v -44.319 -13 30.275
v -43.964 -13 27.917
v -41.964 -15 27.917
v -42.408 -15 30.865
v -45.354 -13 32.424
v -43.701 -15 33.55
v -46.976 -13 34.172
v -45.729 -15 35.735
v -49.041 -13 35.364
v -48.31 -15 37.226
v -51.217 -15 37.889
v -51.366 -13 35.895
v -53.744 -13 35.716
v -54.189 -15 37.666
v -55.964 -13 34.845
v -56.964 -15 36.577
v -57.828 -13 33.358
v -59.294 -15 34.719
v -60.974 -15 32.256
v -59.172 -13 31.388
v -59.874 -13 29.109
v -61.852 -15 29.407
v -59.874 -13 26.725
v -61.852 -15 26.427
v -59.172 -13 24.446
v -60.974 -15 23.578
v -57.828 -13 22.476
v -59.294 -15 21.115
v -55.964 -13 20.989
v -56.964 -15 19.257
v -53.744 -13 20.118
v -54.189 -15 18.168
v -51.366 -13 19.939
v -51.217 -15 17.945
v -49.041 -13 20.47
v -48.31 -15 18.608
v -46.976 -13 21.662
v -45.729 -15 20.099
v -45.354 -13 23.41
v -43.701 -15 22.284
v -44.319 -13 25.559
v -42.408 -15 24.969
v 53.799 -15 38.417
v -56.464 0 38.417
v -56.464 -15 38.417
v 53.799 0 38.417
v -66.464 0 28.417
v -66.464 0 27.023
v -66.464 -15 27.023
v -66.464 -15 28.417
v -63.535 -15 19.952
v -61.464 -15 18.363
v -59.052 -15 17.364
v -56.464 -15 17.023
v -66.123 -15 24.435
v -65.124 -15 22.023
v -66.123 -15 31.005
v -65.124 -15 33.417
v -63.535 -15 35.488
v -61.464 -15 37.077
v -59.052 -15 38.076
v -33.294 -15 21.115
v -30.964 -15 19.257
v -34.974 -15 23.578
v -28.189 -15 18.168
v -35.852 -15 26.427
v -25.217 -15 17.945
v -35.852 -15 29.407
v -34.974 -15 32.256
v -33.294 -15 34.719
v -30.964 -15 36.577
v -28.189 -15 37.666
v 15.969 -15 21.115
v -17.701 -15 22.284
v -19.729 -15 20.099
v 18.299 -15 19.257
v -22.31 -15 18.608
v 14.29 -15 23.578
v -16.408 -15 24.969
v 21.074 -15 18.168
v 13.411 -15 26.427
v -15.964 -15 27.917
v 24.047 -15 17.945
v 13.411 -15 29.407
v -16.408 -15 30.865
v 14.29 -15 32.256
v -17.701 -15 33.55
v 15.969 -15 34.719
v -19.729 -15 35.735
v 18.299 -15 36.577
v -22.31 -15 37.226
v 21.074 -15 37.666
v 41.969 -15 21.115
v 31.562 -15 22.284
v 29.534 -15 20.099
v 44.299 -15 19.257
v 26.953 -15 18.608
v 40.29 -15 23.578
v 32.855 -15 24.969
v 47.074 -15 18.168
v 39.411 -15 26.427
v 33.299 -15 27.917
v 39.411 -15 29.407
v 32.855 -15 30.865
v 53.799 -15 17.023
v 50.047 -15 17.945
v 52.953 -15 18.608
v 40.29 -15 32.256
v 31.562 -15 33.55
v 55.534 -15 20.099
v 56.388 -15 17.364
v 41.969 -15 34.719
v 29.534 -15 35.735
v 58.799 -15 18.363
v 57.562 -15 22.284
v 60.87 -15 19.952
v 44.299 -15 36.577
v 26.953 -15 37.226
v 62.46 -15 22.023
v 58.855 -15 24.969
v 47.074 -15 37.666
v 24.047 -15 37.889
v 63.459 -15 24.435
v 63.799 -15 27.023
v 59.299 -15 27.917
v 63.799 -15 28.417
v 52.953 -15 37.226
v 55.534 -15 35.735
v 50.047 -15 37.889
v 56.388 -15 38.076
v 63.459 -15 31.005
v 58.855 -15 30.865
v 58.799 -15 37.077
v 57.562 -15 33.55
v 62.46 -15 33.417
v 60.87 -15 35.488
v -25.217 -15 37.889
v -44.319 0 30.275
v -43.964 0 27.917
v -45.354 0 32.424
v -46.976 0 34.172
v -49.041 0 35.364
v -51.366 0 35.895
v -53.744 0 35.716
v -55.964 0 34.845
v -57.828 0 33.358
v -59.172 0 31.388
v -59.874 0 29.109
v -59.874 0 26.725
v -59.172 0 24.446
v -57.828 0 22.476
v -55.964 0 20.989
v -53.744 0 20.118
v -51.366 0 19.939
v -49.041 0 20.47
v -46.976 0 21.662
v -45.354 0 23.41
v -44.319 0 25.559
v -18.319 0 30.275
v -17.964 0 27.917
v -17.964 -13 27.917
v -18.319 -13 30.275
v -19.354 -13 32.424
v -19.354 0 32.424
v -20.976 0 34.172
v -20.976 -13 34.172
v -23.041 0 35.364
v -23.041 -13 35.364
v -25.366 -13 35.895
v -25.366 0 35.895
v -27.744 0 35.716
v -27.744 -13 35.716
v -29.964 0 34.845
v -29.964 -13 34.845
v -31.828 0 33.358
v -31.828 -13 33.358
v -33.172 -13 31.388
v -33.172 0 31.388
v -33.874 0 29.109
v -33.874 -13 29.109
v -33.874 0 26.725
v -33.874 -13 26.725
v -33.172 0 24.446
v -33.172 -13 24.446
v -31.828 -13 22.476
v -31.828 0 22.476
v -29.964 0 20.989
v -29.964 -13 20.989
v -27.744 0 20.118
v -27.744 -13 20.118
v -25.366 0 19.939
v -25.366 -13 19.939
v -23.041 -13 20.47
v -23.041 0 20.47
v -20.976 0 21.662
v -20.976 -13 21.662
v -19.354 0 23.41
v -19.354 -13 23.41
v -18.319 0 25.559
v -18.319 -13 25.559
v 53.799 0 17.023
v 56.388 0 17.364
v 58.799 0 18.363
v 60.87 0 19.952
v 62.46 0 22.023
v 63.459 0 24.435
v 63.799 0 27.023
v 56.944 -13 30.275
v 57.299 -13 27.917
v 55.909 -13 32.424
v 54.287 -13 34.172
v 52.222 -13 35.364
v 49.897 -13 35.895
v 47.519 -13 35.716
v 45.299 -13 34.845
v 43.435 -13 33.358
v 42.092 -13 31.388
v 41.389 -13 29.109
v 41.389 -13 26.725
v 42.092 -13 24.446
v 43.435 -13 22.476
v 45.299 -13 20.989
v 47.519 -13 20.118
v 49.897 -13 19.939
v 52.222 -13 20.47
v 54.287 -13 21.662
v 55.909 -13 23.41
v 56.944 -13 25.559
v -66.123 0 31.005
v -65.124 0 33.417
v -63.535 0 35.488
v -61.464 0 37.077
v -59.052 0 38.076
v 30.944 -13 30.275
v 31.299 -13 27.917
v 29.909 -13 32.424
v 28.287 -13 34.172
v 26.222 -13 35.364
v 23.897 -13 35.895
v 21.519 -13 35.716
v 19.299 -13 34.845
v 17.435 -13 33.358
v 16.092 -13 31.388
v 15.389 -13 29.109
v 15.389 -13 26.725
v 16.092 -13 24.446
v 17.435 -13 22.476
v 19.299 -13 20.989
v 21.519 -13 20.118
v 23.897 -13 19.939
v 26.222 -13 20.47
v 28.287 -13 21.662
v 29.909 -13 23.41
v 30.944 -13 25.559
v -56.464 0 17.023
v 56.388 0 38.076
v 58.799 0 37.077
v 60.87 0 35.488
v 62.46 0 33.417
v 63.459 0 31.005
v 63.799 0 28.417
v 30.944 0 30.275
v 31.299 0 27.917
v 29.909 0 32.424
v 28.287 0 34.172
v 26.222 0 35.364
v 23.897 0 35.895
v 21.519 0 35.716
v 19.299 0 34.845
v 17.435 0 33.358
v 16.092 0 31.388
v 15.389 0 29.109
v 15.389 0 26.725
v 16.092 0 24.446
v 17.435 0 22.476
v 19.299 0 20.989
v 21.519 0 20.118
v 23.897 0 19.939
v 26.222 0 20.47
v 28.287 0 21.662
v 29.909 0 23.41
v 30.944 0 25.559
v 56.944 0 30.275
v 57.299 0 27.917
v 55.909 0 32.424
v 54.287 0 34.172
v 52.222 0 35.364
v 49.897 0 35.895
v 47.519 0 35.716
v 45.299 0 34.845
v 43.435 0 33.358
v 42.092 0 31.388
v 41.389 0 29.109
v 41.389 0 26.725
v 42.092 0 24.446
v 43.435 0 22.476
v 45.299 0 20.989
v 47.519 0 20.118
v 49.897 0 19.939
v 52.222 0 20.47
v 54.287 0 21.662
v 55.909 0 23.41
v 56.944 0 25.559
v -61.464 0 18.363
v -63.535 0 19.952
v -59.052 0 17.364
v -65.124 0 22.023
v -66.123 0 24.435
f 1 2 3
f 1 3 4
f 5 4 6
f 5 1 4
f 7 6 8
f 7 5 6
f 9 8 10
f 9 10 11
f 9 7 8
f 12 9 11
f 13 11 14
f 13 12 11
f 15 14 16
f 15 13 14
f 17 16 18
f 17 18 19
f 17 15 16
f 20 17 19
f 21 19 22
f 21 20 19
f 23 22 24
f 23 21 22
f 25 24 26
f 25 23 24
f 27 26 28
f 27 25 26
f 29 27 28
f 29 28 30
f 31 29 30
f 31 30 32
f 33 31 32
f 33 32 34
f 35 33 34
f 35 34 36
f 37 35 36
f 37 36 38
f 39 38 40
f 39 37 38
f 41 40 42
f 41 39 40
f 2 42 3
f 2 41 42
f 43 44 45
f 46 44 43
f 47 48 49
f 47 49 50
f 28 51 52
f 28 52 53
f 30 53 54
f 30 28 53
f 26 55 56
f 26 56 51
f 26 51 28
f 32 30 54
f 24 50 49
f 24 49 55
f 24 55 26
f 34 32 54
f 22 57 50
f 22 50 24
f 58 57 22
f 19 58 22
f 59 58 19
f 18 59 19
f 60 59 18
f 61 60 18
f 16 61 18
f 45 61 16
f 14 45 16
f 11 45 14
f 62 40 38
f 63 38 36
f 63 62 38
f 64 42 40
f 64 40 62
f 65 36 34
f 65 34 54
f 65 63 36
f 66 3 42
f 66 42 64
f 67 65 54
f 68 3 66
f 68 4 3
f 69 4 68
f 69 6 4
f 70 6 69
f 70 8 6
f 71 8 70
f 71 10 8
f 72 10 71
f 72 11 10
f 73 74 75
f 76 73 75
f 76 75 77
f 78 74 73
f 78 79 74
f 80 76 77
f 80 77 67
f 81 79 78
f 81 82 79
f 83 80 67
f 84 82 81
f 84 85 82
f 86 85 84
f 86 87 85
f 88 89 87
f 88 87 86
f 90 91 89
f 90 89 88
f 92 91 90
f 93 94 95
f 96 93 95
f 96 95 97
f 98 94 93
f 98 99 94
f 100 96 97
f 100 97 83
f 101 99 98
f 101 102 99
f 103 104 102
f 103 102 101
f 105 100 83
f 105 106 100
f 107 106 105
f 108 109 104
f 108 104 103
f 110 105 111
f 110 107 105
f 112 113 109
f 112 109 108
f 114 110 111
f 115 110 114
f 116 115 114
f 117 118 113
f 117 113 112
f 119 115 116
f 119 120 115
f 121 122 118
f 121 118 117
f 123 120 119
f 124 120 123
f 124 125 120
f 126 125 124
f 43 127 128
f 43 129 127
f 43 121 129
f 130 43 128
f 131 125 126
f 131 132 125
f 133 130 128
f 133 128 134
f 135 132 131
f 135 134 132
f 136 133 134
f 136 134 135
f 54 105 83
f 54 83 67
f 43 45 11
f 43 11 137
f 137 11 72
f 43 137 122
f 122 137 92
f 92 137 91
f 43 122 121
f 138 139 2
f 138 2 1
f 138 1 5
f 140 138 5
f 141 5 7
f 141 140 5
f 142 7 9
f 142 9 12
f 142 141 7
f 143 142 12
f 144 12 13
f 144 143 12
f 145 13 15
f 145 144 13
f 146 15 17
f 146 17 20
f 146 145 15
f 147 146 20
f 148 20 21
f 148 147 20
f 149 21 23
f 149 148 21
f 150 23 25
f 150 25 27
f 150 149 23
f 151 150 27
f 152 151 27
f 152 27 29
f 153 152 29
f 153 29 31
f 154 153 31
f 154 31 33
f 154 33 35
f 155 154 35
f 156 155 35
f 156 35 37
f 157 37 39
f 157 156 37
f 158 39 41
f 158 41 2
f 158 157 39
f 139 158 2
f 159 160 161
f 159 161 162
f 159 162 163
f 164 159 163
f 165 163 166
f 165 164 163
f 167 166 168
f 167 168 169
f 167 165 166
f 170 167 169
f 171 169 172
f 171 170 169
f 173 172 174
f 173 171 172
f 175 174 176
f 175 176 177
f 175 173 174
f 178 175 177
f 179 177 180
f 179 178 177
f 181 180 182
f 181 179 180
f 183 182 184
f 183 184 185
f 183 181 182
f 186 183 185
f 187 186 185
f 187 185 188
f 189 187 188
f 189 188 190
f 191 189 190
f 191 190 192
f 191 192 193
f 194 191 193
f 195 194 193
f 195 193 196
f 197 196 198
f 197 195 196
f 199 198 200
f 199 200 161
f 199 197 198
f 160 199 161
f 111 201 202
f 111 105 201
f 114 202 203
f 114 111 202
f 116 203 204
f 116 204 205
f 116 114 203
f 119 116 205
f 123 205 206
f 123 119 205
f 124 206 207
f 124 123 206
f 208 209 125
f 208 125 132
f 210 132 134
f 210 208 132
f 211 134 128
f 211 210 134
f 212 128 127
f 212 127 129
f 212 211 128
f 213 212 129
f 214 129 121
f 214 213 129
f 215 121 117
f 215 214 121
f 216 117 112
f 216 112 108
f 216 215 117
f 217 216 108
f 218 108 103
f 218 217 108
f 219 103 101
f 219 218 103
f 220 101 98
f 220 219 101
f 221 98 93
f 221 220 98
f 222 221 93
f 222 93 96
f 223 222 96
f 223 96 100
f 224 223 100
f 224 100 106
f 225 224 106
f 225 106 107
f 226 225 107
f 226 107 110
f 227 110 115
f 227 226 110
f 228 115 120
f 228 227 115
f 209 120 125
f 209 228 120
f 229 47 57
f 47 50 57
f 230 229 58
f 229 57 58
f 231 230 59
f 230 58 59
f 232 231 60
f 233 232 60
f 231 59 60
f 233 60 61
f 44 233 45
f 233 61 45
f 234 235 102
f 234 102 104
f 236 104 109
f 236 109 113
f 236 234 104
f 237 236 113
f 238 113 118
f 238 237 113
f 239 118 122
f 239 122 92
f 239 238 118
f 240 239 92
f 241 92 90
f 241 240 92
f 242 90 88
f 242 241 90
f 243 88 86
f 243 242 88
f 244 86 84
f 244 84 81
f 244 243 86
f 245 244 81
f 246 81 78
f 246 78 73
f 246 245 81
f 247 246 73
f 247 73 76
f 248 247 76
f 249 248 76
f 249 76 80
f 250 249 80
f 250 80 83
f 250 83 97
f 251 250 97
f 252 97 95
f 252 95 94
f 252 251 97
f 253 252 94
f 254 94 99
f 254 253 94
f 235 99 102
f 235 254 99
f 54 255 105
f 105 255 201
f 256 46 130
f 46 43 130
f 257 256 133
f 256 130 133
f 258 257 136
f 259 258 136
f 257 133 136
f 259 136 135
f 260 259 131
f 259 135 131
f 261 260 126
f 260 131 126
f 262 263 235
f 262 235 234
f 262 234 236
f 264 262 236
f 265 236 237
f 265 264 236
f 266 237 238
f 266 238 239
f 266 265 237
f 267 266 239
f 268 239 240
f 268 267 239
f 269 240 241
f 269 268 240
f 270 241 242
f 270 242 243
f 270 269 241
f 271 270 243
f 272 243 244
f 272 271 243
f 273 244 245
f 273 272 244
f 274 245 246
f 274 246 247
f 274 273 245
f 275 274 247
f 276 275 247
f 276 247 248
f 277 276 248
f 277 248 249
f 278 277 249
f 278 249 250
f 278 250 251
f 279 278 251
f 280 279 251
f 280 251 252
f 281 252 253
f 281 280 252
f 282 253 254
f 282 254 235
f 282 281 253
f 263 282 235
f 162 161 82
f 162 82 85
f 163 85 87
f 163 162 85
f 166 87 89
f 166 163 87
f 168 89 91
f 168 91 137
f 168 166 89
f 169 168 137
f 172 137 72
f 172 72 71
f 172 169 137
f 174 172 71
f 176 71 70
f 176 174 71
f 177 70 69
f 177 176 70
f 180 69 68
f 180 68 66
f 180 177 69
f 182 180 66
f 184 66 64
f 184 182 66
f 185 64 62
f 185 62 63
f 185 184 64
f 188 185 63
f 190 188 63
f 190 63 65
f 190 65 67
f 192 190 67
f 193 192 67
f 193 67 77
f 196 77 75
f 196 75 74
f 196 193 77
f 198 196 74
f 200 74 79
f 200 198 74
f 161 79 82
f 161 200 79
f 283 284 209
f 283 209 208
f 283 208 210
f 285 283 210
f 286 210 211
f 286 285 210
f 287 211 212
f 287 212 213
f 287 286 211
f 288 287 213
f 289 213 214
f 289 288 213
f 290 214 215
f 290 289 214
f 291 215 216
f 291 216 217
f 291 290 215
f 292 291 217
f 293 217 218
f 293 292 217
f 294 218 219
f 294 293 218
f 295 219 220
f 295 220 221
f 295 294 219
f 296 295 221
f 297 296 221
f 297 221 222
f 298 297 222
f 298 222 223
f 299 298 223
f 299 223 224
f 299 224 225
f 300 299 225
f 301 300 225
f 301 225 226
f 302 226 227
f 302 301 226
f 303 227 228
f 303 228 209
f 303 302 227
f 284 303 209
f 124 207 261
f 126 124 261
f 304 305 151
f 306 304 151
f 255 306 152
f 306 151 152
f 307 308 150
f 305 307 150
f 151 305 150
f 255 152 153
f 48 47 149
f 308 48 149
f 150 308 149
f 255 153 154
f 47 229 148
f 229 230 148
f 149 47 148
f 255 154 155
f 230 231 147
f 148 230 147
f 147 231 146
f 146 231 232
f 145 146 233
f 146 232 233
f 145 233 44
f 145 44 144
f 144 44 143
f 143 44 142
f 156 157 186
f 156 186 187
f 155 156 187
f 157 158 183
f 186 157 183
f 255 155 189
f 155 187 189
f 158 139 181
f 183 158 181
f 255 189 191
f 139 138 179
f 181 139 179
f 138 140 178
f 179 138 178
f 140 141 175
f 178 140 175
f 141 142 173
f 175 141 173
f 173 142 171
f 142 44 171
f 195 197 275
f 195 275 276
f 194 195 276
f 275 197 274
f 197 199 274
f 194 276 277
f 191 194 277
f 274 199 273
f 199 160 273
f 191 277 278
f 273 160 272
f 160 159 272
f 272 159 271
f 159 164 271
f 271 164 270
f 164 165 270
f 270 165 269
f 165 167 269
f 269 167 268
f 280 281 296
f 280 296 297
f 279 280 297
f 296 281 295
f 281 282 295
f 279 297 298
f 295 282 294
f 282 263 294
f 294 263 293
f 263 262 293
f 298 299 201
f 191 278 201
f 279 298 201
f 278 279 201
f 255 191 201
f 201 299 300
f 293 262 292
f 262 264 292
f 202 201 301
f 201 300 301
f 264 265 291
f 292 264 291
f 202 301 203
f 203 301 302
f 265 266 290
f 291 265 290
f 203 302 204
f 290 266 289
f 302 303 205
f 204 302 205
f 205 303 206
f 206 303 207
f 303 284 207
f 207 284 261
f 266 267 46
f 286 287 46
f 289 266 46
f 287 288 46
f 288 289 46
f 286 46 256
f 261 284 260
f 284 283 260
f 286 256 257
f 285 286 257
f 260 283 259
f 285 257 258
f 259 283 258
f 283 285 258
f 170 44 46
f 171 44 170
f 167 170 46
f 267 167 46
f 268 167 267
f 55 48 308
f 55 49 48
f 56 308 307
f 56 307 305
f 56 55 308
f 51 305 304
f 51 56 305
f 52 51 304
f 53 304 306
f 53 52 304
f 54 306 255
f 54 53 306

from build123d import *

# Parameters (mm, degrees)
F0_W     = 130.263165
F0_H     = 21.393939
F0_R     = 8
F1_DEPTH = 15
F2_R     = 10
F3_SIZE  = 2


with BuildPart() as f1:
    # F0 (on Front) → F1 (new body)
    with BuildSketch(Plane.XZ):
        with Locations((-1.332238, 27.719996)):
            Rectangle(F0_W, F0_H)
        with Locations((-51.963821, 27.916966)):
            Circle(F0_R, mode=Mode.SUBTRACT)
        with Locations((-25.963821, 27.916966)):
            Circle(F0_R, mode=Mode.SUBTRACT)
        with Locations((23.299344, 27.916966)):
            Circle(F0_R, mode=Mode.SUBTRACT)
        with Locations((49.299344, 27.916966)):
            Circle(F0_R, mode=Mode.SUBTRACT)
    extrude(amount=F1_DEPTH)

    # F2
    f2_edges = [f1.edges().sort_by_distance(p)[0] for p in [
        (63.799344, -7.5, 38.416966),
        (63.799344, -7.5, 17.023027),
        (-66.463821, -7.5, 38.416966),
        (-66.463821, -7.5, 17.023027),
    ]]
    fillet(f2_edges, radius=F2_R)

    # F3
    f3_edges = [f1.edges().sort_by_distance(p)[0] for p in [
        (-33.963821, -15, 27.916966),
        (15.299344, -15, 27.916966),
        (41.299344, -15, 27.916966),
        (-59.963821, -15, 27.916966),
    ]]
    chamfer(f3_edges, length=F3_SIZE)


solid = f1.part
